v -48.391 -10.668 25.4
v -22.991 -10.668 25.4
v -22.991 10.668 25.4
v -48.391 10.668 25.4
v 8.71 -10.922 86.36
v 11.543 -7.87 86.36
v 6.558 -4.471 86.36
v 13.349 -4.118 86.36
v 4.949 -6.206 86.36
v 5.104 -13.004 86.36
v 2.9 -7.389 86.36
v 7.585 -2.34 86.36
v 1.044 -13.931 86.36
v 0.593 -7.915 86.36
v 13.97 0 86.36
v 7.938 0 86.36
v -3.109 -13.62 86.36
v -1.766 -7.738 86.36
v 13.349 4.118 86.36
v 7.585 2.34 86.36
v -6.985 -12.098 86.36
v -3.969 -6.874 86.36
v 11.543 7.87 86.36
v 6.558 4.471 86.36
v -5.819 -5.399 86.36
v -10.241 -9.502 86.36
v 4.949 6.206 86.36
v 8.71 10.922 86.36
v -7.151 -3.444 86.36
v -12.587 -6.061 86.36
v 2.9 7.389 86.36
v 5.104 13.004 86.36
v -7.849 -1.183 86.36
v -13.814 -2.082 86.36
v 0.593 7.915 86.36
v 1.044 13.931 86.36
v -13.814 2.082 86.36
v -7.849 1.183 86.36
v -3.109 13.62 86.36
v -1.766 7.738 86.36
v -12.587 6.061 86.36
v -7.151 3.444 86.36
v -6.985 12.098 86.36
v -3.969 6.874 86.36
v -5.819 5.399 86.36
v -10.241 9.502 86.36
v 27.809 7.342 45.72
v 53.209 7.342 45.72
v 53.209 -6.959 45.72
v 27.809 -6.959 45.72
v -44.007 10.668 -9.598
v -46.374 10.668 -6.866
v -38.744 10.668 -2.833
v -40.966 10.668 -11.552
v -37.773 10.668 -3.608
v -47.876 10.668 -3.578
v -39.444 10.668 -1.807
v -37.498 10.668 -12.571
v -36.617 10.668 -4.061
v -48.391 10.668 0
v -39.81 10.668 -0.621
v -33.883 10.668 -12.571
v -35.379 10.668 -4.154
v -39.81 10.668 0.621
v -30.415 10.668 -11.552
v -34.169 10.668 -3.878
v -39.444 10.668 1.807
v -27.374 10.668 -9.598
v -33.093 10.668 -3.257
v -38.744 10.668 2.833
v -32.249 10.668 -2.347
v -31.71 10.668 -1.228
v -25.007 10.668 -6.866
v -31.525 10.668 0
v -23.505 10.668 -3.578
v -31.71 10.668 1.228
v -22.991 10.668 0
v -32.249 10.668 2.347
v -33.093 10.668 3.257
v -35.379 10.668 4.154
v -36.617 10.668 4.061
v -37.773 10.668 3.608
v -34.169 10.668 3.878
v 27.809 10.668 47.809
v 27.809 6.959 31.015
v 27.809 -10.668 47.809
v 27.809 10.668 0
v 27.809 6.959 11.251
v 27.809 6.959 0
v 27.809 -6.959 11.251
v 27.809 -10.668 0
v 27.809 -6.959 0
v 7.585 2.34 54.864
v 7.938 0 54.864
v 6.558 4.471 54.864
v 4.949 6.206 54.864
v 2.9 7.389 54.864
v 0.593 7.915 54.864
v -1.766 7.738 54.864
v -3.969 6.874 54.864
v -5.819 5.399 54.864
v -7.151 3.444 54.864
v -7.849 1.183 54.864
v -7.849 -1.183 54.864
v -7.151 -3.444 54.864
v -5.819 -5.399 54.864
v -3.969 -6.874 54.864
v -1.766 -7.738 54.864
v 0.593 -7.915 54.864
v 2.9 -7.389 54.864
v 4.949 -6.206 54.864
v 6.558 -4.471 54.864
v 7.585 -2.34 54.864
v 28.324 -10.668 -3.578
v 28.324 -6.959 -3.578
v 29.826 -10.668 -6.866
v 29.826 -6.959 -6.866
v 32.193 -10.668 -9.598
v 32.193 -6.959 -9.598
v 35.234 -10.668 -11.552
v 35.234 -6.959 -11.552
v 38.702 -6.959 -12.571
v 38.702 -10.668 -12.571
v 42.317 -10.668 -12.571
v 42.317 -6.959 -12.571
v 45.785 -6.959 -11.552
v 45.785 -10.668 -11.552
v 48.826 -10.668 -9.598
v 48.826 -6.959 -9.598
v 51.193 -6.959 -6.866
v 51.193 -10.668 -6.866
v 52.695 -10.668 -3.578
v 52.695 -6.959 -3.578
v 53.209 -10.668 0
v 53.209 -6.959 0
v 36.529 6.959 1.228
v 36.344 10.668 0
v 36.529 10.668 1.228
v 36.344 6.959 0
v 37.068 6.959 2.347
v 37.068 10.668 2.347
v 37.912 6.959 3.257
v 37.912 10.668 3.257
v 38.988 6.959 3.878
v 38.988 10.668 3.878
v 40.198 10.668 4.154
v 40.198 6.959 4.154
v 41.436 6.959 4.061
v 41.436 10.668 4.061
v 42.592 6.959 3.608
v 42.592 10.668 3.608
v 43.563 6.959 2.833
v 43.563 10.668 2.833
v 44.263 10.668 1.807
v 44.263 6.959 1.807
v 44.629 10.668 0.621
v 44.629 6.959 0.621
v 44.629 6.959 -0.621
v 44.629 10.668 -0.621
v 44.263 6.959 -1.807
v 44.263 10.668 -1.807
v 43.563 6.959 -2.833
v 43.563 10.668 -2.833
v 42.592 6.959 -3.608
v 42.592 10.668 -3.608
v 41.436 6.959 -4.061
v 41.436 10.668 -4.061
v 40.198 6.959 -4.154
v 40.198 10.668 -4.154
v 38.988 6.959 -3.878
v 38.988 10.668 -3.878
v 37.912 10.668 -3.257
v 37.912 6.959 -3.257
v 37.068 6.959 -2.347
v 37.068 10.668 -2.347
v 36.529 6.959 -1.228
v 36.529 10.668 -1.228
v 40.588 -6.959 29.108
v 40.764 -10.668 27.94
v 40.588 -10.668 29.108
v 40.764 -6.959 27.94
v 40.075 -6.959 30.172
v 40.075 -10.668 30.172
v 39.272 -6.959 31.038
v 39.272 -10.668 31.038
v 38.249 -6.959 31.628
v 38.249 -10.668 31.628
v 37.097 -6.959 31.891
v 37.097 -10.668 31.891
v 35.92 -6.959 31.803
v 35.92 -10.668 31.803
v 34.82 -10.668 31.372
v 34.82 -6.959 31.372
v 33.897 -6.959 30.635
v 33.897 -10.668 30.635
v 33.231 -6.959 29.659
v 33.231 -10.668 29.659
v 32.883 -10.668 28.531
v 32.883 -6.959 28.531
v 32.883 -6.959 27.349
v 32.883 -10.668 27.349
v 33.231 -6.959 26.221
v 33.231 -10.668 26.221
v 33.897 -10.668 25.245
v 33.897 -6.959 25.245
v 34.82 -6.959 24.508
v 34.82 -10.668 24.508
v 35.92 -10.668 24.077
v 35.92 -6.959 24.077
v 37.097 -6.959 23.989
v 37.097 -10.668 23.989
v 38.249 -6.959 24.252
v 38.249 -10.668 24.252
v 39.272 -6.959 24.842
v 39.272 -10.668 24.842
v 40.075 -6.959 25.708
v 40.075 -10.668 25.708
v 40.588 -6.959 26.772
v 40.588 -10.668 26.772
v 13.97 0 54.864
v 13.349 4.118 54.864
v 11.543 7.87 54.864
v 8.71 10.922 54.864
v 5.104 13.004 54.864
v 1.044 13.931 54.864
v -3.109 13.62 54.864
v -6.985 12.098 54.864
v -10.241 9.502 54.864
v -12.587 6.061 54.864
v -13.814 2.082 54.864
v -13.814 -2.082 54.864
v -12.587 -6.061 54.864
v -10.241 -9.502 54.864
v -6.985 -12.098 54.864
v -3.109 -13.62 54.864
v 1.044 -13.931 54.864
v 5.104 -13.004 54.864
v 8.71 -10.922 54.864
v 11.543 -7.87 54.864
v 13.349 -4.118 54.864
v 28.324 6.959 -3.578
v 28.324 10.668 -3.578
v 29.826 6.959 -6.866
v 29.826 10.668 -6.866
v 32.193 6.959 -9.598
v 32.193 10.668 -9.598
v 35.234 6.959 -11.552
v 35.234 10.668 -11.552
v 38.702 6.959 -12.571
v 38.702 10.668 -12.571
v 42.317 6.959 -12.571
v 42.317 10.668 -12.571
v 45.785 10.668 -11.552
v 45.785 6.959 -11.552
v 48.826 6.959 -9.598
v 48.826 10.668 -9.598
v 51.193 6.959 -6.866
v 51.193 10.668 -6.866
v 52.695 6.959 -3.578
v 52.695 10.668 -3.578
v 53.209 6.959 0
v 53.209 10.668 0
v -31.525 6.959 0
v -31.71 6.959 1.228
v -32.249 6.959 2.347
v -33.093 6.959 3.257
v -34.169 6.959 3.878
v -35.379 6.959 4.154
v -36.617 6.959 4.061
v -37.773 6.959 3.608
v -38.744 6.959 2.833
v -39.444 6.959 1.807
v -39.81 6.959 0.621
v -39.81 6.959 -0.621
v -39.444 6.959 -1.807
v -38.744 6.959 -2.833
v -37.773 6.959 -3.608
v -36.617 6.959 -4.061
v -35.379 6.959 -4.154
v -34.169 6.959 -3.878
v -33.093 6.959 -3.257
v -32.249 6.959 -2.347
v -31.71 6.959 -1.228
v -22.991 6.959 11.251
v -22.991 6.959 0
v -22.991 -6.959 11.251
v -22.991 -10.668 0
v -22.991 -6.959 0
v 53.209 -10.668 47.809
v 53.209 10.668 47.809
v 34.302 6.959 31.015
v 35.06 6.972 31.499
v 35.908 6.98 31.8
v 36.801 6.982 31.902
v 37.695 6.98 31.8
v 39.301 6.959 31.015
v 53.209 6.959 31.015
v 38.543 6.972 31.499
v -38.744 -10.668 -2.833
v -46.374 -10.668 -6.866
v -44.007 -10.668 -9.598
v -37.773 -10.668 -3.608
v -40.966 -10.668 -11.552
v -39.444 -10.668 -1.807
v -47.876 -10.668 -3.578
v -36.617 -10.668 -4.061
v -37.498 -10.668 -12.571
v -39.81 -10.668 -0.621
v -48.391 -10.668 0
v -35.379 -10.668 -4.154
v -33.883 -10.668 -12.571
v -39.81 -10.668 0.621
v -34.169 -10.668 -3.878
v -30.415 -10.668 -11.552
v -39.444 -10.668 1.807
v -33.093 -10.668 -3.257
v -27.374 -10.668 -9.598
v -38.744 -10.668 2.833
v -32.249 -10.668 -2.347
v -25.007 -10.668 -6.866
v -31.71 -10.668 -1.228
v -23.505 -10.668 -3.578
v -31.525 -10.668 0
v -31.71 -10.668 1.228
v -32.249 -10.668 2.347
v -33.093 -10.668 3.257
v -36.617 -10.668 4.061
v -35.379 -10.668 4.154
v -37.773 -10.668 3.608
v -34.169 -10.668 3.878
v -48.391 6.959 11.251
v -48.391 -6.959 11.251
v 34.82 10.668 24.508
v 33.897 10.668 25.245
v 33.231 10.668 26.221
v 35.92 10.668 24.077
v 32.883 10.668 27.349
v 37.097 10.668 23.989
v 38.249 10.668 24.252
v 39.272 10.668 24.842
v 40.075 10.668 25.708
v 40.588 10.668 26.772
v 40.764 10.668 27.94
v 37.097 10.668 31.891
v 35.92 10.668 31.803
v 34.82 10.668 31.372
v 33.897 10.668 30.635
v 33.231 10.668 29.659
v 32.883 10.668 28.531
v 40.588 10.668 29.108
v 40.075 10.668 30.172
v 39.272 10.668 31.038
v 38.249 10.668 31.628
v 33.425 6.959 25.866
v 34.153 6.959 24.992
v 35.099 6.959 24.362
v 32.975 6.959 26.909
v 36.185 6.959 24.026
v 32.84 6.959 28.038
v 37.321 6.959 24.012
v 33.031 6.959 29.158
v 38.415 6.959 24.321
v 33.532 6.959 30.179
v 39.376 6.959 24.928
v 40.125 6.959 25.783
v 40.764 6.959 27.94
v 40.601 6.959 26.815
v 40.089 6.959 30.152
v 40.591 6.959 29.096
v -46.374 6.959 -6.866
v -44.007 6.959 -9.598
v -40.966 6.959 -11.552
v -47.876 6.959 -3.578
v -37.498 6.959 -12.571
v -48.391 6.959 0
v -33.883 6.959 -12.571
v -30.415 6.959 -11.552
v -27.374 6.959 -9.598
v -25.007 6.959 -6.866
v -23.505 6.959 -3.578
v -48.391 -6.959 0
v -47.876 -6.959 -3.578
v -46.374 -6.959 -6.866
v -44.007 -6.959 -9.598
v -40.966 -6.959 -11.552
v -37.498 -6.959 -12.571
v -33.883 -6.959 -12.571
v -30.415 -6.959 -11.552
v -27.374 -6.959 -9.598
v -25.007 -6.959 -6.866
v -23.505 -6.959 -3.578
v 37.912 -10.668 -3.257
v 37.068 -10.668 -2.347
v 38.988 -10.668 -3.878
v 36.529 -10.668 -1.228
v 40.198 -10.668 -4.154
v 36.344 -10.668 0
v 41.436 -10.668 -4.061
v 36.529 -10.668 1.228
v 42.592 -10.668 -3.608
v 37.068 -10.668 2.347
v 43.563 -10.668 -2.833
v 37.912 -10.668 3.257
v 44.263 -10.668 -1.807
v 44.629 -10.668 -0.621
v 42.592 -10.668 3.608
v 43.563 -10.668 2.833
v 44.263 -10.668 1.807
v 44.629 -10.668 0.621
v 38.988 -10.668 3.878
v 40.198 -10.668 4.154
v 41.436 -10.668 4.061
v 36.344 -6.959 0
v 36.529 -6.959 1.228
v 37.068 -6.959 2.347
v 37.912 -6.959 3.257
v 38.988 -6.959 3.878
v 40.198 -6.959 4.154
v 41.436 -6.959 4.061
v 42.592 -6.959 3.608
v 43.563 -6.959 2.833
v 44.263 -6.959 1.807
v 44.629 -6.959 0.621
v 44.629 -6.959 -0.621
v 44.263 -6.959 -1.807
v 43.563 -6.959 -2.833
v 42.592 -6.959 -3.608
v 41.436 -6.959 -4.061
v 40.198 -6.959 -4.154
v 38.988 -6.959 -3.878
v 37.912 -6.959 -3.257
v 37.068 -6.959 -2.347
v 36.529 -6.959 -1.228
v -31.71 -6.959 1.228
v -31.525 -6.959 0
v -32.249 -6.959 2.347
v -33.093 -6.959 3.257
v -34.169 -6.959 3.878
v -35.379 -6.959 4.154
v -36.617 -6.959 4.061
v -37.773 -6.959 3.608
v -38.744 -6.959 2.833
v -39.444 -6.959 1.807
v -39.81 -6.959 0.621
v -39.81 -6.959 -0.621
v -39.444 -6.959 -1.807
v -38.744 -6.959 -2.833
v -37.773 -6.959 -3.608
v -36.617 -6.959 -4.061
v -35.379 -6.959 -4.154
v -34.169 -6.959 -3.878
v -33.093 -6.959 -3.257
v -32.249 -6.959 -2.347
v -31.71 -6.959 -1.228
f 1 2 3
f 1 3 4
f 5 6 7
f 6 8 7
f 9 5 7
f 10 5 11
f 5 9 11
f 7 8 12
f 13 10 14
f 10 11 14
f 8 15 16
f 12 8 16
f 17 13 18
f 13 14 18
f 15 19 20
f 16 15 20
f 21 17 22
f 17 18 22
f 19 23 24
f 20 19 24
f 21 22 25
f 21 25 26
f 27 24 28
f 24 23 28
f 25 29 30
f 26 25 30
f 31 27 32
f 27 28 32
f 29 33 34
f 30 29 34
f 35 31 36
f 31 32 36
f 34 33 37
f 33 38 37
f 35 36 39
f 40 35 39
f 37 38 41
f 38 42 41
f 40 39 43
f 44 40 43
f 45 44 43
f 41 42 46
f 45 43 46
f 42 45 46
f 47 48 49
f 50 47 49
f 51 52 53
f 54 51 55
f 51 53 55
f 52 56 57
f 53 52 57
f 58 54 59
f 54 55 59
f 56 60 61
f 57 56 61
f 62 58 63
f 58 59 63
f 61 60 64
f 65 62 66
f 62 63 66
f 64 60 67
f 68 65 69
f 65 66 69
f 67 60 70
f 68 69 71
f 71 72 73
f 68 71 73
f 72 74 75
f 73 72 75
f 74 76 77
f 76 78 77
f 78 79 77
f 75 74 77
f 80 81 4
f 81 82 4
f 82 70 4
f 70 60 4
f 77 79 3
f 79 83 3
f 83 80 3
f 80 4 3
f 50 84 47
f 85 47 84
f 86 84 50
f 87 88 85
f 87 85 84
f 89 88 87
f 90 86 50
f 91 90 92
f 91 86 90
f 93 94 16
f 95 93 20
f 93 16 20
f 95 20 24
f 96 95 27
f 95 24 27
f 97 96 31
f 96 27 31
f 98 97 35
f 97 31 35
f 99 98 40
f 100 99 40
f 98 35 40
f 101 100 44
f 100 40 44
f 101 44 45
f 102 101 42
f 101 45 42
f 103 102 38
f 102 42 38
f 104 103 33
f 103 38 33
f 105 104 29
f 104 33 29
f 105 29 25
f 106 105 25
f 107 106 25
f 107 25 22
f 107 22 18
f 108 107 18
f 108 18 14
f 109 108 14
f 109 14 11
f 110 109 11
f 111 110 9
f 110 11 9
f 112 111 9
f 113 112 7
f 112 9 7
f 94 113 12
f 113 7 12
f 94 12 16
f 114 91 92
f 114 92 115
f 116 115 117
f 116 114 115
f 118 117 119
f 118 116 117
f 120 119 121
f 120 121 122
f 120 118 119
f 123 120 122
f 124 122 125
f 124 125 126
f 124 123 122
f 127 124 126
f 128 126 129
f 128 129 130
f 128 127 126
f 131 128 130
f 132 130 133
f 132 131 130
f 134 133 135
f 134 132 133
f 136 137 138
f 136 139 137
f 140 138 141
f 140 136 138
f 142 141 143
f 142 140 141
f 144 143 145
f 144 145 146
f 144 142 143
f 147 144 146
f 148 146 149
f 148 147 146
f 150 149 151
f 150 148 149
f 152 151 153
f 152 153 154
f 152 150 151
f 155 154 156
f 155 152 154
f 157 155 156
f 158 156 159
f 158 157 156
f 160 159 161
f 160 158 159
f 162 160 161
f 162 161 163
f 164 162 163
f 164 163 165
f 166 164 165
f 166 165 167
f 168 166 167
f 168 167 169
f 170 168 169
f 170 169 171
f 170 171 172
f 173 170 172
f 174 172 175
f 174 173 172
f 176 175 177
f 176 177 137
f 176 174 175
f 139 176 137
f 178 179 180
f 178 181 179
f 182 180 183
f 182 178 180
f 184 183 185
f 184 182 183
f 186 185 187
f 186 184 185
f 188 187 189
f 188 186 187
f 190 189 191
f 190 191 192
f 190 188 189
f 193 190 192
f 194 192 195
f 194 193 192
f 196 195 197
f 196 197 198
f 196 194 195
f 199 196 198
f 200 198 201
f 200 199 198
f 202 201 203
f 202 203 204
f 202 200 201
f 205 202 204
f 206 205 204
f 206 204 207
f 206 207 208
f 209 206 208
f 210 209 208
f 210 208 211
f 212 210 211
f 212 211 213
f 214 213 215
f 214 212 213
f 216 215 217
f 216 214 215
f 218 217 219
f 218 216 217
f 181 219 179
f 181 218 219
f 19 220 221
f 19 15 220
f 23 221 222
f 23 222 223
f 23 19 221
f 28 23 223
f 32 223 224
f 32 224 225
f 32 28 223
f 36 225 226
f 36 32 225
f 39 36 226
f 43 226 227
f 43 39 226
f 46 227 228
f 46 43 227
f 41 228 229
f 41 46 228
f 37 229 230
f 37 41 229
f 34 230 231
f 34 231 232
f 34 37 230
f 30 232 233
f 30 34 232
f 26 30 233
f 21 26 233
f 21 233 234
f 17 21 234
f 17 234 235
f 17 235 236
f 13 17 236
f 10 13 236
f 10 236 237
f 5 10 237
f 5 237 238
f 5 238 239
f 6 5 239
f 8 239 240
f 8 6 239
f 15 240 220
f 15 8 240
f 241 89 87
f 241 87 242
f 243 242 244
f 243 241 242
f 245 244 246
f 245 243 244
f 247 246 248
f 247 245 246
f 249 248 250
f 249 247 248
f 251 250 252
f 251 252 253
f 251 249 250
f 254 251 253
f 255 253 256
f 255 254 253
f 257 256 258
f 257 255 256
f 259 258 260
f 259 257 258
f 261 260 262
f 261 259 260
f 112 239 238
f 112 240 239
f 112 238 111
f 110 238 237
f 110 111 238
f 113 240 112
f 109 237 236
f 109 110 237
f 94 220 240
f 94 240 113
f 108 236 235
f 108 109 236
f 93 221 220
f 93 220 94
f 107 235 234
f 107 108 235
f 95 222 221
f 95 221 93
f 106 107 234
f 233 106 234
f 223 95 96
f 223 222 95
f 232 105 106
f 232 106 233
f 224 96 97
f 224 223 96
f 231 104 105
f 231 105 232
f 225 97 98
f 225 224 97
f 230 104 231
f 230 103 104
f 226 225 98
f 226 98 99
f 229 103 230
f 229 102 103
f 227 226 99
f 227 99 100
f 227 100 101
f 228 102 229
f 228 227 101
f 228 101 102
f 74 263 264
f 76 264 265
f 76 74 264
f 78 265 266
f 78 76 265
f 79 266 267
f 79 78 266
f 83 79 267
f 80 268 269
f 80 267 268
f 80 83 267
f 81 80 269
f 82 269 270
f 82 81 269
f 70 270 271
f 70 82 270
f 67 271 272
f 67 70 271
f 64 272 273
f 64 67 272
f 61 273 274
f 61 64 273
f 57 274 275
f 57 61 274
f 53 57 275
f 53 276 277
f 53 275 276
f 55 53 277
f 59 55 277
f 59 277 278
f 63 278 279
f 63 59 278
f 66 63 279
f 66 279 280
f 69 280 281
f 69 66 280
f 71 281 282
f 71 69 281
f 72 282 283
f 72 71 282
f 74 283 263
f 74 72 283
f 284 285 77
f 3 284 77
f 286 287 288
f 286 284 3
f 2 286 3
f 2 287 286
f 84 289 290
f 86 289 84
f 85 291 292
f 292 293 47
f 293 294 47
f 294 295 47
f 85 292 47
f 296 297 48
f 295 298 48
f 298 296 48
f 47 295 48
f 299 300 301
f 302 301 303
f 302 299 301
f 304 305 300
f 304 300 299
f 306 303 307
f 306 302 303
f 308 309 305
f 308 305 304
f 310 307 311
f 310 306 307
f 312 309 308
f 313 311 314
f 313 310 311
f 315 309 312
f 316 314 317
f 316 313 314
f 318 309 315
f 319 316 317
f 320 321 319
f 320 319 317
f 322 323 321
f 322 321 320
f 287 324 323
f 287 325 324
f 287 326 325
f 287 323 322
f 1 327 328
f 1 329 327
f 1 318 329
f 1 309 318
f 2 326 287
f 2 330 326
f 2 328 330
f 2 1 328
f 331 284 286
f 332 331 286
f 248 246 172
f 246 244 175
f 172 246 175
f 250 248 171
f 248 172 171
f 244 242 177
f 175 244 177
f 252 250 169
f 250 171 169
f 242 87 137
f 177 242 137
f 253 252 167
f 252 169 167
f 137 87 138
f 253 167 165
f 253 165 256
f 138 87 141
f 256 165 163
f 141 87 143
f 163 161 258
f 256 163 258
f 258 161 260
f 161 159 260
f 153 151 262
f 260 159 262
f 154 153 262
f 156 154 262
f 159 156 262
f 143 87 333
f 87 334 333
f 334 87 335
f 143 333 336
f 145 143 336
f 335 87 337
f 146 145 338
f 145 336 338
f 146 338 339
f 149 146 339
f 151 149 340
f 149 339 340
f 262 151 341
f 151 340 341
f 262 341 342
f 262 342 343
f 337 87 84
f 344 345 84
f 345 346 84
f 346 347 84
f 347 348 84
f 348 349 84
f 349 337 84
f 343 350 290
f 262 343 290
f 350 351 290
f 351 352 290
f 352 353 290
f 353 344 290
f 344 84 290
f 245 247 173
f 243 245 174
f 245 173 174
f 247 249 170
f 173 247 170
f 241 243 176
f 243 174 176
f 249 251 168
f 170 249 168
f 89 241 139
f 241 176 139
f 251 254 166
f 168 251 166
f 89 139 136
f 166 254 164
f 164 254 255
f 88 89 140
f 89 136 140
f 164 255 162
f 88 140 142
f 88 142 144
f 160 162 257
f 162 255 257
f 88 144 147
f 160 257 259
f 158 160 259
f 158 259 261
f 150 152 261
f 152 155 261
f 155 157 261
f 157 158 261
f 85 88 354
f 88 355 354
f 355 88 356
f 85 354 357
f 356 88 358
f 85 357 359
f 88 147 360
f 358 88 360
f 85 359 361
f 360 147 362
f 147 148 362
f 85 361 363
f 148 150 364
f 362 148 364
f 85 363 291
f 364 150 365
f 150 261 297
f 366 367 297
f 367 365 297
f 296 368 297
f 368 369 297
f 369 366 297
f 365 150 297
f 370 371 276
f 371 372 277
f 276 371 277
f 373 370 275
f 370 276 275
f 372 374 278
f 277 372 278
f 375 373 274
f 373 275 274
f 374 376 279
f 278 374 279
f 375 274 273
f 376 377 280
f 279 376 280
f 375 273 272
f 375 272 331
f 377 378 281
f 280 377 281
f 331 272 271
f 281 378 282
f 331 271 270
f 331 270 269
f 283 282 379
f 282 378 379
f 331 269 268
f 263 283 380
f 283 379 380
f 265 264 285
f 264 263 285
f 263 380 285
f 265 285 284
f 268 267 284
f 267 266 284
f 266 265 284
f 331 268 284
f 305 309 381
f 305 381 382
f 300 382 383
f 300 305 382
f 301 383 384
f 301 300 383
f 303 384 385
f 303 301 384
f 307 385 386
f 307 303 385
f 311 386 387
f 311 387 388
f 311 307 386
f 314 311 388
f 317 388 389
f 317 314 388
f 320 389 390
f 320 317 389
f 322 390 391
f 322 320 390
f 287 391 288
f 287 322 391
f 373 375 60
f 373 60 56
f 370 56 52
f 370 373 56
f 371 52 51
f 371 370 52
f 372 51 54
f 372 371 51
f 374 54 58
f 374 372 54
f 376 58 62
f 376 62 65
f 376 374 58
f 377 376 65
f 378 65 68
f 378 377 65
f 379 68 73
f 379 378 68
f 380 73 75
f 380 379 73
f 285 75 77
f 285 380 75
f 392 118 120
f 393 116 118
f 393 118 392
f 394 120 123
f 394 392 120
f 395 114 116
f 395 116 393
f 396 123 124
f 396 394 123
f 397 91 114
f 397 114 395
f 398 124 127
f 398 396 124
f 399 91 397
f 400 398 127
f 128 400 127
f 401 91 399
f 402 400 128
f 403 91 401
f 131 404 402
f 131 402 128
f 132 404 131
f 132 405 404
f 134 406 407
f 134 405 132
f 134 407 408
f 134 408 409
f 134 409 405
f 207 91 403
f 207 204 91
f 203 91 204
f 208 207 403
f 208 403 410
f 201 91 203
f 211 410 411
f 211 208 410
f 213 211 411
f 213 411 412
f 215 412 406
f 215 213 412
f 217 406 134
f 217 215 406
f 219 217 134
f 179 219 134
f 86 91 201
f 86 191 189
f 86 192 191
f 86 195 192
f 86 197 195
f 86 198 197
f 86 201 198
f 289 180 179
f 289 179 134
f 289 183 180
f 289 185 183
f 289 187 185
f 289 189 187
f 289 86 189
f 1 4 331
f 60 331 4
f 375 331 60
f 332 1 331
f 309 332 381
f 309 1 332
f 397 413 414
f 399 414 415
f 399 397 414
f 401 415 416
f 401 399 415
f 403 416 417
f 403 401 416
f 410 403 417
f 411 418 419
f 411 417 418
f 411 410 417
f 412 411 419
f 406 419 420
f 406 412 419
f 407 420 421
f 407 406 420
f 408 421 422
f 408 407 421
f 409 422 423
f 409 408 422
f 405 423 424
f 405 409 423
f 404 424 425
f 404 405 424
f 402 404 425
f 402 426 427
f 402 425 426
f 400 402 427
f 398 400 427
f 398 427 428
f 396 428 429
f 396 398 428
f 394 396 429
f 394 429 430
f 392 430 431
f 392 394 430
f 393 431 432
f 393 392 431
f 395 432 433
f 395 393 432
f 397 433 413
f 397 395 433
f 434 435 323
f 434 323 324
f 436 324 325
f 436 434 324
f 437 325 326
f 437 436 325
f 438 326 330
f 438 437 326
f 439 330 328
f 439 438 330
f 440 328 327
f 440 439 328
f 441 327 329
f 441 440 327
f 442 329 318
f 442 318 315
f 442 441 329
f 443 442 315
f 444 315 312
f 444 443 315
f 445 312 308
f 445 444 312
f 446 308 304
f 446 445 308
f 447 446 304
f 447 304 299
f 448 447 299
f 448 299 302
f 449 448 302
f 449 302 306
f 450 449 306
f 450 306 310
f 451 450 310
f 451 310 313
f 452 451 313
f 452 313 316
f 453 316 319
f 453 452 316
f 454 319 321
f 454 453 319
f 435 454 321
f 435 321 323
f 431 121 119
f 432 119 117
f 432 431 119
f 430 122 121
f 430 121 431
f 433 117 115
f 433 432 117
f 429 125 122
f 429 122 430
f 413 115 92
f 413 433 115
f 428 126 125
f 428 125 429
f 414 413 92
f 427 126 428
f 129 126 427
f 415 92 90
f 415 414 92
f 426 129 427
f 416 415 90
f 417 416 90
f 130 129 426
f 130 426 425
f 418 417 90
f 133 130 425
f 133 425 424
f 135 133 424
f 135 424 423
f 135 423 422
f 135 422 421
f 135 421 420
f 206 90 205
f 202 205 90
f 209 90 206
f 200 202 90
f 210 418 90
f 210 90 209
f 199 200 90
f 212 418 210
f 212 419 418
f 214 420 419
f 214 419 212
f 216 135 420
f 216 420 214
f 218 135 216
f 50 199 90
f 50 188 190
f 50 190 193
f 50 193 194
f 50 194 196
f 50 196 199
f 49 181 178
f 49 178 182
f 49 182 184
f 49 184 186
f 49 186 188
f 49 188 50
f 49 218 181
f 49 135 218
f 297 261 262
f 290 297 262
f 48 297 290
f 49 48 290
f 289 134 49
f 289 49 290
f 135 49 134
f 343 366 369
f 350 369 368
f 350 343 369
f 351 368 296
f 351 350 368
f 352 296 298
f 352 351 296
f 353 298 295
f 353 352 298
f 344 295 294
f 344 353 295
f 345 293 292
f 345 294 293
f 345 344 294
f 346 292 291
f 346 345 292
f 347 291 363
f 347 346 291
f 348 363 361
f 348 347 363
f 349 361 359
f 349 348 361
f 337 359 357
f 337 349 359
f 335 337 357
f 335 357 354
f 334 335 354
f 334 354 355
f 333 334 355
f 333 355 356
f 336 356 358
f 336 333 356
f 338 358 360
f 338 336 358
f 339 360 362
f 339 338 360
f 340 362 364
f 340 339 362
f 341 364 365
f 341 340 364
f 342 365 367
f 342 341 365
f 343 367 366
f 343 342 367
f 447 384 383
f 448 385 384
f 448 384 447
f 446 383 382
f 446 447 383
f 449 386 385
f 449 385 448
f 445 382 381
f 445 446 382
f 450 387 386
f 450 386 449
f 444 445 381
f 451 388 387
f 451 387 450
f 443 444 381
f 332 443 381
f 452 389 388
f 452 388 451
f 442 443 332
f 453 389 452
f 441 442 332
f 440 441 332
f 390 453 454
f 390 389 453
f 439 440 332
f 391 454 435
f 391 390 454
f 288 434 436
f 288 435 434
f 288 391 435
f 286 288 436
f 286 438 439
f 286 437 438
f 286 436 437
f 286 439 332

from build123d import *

# Parameters (mm, degrees)
F0_W     = 6.0325
F0_H     = 31.496
F0_R     = 4.1656
F2_DEPTH = 10.668
F0_R_2   = 3.9624
F3_W     = 13.9187620953
F3_H     = 16.6894979775
F4_DEPTH = 101.601
F5_DEPTH = 101.601


# Not quite as in the source:
# - the program builds the solid bodies; features that only make, move or delete a surface that nothing else refers to are left out


with BuildPart() as f1:
    # F0 (on Front) → F1 (revolve)
    with BuildSketch(Plane.XZ):
        with Locations((10.95375, 70.612)):
            Rectangle(F0_W, F0_H)
    revolve(axis=Axis((0, 0, 43.18), (0, 0, 1)))


with BuildPart() as f2:
    # F0 (on Front) → F2 (new body, symmetric)
    with BuildSketch(Plane.XZ):
        with BuildLine():
            ThreePointArc((-48.3905182989, 0), (-35.6905182989, 12.7), (-22.9905182989, 0))
            Line((-22.9905182989, 0), (-22.9905182989, 25.4))
            Line((-22.9905182989, 25.4), (-48.3905182989, 25.4))
            Line((-48.3905182989, 25.4), (-48.3905182989, 0))
        make_face()
        with BuildLine():
            ThreePointArc((-48.3905182989, 0), (-35.6905182989, -12.7), (-22.9905182989, 0))
            ThreePointArc((-22.9905182989, 0), (-35.6905182989, 12.7), (-48.3905182989, 0))
        make_face()
        with Locations((-35.6905182989, 0)):
            Circle(F0_R, mode=Mode.SUBTRACT)
    extrude(amount=F2_DEPTH, both=True)


with BuildPart() as f2b:
    # F0 (on Front) → F2, piece 2 (new body, symmetric)
    with BuildSketch(Plane.XZ):
        with BuildLine():
            ThreePointArc((27.8094817011, 0), (40.5094817011, 12.7), (53.2094817011, 0))
            Line((53.2094817011, 0), (53.2094817011, 47.8088483214))
            Line((53.2094817011, 47.8088483214), (27.8094817011, 47.8088483214))
            Line((27.8094817011, 47.8088483214), (27.8094817011, 0))
        make_face()
        with Locations((36.8013158441, 27.94)):
            Circle(F0_R_2, mode=Mode.SUBTRACT)
        with BuildLine():
            ThreePointArc((27.8094817011, 0), (40.5094817011, -12.7), (53.2094817011, 0))
            ThreePointArc((53.2094817011, 0), (40.5094817011, 12.7), (27.8094817011, 0))
        make_face()
        with BuildLine():
            ThreePointArc((44.6750817011, 0), (40.5094817011, -4.1656), (36.3438817011, 0))
            ThreePointArc((36.3438817011, 0), (40.5094817011, 4.1656), (44.6750817011, 0))
        make_face(mode=Mode.SUBTRACT)
    extrude(amount=F2_DEPTH, both=True)


with BuildPart() as f4_tool:
    # F3 (on face) → F4 (new body, through all)
    with BuildSketch(Plane.YZ.offset(53.2094817011)):
        with Locations((0, -8.3447489887)):
            Rectangle(F3_W, F3_H)
        Polygon((-6.9593810476, 0), (6.9593810476, 0), (6.9593810476, 11.2505020225), (-4.3954011053, 11.2505020225), (-6.9593810476, 11.2505020225), align=None)
        Polygon((-6.9593810476, 31.0145973873), (6.9593810476, 31.0145973873), (7.3419297114, 45.72), (-6.9593810476, 45.72), align=None)
    extrude(amount=-F4_DEPTH)


with BuildPart() as f2_1:
    add(f2.part)

    # F4: cut by f4_tool
    add(f4_tool.part, mode=Mode.SUBTRACT)


with BuildPart() as f2b_1:
    add(f2b.part)

    # F4: cut by f4_tool
    add(f4_tool.part, mode=Mode.SUBTRACT)

    # F3 (on face) → F5 (cut, through all)
    with BuildSketch(Plane.YZ.offset(53.2094817011)):
        with Locations((0, -8.3447489887)):
            Rectangle(F3_W, F3_H)
        Polygon((-4.3954011053, 11.2505020225), (6.9593810476, 11.2505020225), (6.9593810476, 31.0145973873), (-6.9593810476, 31.0145973873), (-6.9593810476, 11.2505020225), align=None)
    extrude(amount=-F5_DEPTH, mode=Mode.SUBTRACT)


solid = Compound([f1.part, f2_1.part, f2b_1.part])
